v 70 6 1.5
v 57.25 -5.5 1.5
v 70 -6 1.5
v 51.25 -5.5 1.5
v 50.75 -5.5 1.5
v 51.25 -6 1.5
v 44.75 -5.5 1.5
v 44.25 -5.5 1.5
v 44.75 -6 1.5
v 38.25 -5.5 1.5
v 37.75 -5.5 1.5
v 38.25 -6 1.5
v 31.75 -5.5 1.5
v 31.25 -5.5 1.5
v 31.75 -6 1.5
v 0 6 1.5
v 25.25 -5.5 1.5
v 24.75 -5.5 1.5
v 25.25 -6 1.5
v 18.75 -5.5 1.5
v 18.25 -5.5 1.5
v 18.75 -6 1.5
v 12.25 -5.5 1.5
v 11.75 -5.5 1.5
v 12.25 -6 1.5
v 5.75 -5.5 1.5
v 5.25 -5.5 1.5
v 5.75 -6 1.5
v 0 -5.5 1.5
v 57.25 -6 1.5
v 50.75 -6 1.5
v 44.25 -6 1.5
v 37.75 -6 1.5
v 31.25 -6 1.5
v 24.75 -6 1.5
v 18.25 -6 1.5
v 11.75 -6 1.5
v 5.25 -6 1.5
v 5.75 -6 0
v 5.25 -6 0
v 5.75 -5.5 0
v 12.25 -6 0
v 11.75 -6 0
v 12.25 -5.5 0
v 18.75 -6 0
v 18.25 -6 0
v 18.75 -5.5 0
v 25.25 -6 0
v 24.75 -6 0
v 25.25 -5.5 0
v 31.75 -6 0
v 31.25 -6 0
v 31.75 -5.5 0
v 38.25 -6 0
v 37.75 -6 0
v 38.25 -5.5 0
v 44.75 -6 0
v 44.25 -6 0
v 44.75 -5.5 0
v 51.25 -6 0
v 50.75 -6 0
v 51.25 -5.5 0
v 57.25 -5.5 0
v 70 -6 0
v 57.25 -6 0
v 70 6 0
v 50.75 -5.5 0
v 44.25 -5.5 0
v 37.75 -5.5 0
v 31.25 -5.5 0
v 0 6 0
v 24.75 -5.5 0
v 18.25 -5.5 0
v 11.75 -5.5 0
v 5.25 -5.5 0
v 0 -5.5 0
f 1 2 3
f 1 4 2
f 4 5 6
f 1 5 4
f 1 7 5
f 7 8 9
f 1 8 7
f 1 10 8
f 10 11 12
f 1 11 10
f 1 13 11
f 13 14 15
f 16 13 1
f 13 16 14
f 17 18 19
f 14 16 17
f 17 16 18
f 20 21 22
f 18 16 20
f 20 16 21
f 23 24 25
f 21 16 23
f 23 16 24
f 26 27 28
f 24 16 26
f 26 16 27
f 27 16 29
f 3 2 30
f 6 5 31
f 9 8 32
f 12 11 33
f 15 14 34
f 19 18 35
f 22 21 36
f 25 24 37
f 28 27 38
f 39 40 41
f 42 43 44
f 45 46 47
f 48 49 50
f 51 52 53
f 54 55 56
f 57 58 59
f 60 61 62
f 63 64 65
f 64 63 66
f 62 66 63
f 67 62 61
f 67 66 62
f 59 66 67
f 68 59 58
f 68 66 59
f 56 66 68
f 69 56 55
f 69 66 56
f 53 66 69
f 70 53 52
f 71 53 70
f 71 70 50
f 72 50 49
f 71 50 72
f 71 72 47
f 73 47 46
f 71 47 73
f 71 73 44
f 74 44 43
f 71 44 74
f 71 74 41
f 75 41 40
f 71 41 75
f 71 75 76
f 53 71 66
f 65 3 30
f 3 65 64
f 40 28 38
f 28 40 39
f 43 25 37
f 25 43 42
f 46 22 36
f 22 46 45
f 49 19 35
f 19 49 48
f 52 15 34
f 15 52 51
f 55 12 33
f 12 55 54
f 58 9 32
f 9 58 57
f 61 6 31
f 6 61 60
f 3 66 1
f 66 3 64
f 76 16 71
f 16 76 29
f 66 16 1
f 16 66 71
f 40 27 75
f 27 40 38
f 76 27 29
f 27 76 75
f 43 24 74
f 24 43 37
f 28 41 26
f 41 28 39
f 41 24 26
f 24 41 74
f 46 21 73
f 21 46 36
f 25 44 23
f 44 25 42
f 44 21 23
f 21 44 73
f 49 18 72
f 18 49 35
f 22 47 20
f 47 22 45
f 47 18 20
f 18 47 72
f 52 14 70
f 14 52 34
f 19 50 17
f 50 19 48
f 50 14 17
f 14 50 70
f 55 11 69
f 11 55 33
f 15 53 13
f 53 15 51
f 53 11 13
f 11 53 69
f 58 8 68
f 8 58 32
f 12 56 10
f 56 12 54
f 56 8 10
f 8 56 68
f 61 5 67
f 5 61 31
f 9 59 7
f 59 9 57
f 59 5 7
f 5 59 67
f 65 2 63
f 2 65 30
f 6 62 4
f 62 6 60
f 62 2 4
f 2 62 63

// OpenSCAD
// 10-well comb for agarose gel casting, printed lying flat
// Units: mm

// ---- Parameters ----
plate_t      = 1.5;     // plate thickness (Z)
spine_len    = 70;      // spine length along X
spine_wid    = 12;      // spine width along Y
tooth_count  = 10;      // number of teeth
tooth_w      = 5.0;     // tooth width along X
tooth_l      = 12;      // tooth length along Y
tooth_h      = 12;      // tooth height from spine edge (-Y)
gap          = 1.5;     // gap between teeth along X
eps          = 0.5;     // cutter overshoot past faces

// Derived
pitch        = tooth_w + gap;   // centre-to-centre spacing along X
x0           = -(tooth_count - 1) * gap / 2;  // first tooth X offset

// ---- Model ----
difference() {
    union() {
        // Spine
        translate([0, -spine_wid / 2, 0])
            cube([spine_len, spine_wid, plate_t]);

        // Teeth
        for (i = [0 : tooth_count - 1])
            translate([x0 + i * pitch, -spine_wid / 2 - tooth_h, 0])
                cube([tooth_w, tooth_l, plate_t]);
    }

    // Notch under each tooth (cuts into the spine, so the teeth stand proud)
    for (i = [0 : tooth_count - 1])
        translate([x0 + i * pitch - eps, -spine_wid / 2 - tooth_h - eps, 0])
            cube([tooth_w + 2 * eps, tooth_l + 2 * eps, tooth_h + eps]);
}
